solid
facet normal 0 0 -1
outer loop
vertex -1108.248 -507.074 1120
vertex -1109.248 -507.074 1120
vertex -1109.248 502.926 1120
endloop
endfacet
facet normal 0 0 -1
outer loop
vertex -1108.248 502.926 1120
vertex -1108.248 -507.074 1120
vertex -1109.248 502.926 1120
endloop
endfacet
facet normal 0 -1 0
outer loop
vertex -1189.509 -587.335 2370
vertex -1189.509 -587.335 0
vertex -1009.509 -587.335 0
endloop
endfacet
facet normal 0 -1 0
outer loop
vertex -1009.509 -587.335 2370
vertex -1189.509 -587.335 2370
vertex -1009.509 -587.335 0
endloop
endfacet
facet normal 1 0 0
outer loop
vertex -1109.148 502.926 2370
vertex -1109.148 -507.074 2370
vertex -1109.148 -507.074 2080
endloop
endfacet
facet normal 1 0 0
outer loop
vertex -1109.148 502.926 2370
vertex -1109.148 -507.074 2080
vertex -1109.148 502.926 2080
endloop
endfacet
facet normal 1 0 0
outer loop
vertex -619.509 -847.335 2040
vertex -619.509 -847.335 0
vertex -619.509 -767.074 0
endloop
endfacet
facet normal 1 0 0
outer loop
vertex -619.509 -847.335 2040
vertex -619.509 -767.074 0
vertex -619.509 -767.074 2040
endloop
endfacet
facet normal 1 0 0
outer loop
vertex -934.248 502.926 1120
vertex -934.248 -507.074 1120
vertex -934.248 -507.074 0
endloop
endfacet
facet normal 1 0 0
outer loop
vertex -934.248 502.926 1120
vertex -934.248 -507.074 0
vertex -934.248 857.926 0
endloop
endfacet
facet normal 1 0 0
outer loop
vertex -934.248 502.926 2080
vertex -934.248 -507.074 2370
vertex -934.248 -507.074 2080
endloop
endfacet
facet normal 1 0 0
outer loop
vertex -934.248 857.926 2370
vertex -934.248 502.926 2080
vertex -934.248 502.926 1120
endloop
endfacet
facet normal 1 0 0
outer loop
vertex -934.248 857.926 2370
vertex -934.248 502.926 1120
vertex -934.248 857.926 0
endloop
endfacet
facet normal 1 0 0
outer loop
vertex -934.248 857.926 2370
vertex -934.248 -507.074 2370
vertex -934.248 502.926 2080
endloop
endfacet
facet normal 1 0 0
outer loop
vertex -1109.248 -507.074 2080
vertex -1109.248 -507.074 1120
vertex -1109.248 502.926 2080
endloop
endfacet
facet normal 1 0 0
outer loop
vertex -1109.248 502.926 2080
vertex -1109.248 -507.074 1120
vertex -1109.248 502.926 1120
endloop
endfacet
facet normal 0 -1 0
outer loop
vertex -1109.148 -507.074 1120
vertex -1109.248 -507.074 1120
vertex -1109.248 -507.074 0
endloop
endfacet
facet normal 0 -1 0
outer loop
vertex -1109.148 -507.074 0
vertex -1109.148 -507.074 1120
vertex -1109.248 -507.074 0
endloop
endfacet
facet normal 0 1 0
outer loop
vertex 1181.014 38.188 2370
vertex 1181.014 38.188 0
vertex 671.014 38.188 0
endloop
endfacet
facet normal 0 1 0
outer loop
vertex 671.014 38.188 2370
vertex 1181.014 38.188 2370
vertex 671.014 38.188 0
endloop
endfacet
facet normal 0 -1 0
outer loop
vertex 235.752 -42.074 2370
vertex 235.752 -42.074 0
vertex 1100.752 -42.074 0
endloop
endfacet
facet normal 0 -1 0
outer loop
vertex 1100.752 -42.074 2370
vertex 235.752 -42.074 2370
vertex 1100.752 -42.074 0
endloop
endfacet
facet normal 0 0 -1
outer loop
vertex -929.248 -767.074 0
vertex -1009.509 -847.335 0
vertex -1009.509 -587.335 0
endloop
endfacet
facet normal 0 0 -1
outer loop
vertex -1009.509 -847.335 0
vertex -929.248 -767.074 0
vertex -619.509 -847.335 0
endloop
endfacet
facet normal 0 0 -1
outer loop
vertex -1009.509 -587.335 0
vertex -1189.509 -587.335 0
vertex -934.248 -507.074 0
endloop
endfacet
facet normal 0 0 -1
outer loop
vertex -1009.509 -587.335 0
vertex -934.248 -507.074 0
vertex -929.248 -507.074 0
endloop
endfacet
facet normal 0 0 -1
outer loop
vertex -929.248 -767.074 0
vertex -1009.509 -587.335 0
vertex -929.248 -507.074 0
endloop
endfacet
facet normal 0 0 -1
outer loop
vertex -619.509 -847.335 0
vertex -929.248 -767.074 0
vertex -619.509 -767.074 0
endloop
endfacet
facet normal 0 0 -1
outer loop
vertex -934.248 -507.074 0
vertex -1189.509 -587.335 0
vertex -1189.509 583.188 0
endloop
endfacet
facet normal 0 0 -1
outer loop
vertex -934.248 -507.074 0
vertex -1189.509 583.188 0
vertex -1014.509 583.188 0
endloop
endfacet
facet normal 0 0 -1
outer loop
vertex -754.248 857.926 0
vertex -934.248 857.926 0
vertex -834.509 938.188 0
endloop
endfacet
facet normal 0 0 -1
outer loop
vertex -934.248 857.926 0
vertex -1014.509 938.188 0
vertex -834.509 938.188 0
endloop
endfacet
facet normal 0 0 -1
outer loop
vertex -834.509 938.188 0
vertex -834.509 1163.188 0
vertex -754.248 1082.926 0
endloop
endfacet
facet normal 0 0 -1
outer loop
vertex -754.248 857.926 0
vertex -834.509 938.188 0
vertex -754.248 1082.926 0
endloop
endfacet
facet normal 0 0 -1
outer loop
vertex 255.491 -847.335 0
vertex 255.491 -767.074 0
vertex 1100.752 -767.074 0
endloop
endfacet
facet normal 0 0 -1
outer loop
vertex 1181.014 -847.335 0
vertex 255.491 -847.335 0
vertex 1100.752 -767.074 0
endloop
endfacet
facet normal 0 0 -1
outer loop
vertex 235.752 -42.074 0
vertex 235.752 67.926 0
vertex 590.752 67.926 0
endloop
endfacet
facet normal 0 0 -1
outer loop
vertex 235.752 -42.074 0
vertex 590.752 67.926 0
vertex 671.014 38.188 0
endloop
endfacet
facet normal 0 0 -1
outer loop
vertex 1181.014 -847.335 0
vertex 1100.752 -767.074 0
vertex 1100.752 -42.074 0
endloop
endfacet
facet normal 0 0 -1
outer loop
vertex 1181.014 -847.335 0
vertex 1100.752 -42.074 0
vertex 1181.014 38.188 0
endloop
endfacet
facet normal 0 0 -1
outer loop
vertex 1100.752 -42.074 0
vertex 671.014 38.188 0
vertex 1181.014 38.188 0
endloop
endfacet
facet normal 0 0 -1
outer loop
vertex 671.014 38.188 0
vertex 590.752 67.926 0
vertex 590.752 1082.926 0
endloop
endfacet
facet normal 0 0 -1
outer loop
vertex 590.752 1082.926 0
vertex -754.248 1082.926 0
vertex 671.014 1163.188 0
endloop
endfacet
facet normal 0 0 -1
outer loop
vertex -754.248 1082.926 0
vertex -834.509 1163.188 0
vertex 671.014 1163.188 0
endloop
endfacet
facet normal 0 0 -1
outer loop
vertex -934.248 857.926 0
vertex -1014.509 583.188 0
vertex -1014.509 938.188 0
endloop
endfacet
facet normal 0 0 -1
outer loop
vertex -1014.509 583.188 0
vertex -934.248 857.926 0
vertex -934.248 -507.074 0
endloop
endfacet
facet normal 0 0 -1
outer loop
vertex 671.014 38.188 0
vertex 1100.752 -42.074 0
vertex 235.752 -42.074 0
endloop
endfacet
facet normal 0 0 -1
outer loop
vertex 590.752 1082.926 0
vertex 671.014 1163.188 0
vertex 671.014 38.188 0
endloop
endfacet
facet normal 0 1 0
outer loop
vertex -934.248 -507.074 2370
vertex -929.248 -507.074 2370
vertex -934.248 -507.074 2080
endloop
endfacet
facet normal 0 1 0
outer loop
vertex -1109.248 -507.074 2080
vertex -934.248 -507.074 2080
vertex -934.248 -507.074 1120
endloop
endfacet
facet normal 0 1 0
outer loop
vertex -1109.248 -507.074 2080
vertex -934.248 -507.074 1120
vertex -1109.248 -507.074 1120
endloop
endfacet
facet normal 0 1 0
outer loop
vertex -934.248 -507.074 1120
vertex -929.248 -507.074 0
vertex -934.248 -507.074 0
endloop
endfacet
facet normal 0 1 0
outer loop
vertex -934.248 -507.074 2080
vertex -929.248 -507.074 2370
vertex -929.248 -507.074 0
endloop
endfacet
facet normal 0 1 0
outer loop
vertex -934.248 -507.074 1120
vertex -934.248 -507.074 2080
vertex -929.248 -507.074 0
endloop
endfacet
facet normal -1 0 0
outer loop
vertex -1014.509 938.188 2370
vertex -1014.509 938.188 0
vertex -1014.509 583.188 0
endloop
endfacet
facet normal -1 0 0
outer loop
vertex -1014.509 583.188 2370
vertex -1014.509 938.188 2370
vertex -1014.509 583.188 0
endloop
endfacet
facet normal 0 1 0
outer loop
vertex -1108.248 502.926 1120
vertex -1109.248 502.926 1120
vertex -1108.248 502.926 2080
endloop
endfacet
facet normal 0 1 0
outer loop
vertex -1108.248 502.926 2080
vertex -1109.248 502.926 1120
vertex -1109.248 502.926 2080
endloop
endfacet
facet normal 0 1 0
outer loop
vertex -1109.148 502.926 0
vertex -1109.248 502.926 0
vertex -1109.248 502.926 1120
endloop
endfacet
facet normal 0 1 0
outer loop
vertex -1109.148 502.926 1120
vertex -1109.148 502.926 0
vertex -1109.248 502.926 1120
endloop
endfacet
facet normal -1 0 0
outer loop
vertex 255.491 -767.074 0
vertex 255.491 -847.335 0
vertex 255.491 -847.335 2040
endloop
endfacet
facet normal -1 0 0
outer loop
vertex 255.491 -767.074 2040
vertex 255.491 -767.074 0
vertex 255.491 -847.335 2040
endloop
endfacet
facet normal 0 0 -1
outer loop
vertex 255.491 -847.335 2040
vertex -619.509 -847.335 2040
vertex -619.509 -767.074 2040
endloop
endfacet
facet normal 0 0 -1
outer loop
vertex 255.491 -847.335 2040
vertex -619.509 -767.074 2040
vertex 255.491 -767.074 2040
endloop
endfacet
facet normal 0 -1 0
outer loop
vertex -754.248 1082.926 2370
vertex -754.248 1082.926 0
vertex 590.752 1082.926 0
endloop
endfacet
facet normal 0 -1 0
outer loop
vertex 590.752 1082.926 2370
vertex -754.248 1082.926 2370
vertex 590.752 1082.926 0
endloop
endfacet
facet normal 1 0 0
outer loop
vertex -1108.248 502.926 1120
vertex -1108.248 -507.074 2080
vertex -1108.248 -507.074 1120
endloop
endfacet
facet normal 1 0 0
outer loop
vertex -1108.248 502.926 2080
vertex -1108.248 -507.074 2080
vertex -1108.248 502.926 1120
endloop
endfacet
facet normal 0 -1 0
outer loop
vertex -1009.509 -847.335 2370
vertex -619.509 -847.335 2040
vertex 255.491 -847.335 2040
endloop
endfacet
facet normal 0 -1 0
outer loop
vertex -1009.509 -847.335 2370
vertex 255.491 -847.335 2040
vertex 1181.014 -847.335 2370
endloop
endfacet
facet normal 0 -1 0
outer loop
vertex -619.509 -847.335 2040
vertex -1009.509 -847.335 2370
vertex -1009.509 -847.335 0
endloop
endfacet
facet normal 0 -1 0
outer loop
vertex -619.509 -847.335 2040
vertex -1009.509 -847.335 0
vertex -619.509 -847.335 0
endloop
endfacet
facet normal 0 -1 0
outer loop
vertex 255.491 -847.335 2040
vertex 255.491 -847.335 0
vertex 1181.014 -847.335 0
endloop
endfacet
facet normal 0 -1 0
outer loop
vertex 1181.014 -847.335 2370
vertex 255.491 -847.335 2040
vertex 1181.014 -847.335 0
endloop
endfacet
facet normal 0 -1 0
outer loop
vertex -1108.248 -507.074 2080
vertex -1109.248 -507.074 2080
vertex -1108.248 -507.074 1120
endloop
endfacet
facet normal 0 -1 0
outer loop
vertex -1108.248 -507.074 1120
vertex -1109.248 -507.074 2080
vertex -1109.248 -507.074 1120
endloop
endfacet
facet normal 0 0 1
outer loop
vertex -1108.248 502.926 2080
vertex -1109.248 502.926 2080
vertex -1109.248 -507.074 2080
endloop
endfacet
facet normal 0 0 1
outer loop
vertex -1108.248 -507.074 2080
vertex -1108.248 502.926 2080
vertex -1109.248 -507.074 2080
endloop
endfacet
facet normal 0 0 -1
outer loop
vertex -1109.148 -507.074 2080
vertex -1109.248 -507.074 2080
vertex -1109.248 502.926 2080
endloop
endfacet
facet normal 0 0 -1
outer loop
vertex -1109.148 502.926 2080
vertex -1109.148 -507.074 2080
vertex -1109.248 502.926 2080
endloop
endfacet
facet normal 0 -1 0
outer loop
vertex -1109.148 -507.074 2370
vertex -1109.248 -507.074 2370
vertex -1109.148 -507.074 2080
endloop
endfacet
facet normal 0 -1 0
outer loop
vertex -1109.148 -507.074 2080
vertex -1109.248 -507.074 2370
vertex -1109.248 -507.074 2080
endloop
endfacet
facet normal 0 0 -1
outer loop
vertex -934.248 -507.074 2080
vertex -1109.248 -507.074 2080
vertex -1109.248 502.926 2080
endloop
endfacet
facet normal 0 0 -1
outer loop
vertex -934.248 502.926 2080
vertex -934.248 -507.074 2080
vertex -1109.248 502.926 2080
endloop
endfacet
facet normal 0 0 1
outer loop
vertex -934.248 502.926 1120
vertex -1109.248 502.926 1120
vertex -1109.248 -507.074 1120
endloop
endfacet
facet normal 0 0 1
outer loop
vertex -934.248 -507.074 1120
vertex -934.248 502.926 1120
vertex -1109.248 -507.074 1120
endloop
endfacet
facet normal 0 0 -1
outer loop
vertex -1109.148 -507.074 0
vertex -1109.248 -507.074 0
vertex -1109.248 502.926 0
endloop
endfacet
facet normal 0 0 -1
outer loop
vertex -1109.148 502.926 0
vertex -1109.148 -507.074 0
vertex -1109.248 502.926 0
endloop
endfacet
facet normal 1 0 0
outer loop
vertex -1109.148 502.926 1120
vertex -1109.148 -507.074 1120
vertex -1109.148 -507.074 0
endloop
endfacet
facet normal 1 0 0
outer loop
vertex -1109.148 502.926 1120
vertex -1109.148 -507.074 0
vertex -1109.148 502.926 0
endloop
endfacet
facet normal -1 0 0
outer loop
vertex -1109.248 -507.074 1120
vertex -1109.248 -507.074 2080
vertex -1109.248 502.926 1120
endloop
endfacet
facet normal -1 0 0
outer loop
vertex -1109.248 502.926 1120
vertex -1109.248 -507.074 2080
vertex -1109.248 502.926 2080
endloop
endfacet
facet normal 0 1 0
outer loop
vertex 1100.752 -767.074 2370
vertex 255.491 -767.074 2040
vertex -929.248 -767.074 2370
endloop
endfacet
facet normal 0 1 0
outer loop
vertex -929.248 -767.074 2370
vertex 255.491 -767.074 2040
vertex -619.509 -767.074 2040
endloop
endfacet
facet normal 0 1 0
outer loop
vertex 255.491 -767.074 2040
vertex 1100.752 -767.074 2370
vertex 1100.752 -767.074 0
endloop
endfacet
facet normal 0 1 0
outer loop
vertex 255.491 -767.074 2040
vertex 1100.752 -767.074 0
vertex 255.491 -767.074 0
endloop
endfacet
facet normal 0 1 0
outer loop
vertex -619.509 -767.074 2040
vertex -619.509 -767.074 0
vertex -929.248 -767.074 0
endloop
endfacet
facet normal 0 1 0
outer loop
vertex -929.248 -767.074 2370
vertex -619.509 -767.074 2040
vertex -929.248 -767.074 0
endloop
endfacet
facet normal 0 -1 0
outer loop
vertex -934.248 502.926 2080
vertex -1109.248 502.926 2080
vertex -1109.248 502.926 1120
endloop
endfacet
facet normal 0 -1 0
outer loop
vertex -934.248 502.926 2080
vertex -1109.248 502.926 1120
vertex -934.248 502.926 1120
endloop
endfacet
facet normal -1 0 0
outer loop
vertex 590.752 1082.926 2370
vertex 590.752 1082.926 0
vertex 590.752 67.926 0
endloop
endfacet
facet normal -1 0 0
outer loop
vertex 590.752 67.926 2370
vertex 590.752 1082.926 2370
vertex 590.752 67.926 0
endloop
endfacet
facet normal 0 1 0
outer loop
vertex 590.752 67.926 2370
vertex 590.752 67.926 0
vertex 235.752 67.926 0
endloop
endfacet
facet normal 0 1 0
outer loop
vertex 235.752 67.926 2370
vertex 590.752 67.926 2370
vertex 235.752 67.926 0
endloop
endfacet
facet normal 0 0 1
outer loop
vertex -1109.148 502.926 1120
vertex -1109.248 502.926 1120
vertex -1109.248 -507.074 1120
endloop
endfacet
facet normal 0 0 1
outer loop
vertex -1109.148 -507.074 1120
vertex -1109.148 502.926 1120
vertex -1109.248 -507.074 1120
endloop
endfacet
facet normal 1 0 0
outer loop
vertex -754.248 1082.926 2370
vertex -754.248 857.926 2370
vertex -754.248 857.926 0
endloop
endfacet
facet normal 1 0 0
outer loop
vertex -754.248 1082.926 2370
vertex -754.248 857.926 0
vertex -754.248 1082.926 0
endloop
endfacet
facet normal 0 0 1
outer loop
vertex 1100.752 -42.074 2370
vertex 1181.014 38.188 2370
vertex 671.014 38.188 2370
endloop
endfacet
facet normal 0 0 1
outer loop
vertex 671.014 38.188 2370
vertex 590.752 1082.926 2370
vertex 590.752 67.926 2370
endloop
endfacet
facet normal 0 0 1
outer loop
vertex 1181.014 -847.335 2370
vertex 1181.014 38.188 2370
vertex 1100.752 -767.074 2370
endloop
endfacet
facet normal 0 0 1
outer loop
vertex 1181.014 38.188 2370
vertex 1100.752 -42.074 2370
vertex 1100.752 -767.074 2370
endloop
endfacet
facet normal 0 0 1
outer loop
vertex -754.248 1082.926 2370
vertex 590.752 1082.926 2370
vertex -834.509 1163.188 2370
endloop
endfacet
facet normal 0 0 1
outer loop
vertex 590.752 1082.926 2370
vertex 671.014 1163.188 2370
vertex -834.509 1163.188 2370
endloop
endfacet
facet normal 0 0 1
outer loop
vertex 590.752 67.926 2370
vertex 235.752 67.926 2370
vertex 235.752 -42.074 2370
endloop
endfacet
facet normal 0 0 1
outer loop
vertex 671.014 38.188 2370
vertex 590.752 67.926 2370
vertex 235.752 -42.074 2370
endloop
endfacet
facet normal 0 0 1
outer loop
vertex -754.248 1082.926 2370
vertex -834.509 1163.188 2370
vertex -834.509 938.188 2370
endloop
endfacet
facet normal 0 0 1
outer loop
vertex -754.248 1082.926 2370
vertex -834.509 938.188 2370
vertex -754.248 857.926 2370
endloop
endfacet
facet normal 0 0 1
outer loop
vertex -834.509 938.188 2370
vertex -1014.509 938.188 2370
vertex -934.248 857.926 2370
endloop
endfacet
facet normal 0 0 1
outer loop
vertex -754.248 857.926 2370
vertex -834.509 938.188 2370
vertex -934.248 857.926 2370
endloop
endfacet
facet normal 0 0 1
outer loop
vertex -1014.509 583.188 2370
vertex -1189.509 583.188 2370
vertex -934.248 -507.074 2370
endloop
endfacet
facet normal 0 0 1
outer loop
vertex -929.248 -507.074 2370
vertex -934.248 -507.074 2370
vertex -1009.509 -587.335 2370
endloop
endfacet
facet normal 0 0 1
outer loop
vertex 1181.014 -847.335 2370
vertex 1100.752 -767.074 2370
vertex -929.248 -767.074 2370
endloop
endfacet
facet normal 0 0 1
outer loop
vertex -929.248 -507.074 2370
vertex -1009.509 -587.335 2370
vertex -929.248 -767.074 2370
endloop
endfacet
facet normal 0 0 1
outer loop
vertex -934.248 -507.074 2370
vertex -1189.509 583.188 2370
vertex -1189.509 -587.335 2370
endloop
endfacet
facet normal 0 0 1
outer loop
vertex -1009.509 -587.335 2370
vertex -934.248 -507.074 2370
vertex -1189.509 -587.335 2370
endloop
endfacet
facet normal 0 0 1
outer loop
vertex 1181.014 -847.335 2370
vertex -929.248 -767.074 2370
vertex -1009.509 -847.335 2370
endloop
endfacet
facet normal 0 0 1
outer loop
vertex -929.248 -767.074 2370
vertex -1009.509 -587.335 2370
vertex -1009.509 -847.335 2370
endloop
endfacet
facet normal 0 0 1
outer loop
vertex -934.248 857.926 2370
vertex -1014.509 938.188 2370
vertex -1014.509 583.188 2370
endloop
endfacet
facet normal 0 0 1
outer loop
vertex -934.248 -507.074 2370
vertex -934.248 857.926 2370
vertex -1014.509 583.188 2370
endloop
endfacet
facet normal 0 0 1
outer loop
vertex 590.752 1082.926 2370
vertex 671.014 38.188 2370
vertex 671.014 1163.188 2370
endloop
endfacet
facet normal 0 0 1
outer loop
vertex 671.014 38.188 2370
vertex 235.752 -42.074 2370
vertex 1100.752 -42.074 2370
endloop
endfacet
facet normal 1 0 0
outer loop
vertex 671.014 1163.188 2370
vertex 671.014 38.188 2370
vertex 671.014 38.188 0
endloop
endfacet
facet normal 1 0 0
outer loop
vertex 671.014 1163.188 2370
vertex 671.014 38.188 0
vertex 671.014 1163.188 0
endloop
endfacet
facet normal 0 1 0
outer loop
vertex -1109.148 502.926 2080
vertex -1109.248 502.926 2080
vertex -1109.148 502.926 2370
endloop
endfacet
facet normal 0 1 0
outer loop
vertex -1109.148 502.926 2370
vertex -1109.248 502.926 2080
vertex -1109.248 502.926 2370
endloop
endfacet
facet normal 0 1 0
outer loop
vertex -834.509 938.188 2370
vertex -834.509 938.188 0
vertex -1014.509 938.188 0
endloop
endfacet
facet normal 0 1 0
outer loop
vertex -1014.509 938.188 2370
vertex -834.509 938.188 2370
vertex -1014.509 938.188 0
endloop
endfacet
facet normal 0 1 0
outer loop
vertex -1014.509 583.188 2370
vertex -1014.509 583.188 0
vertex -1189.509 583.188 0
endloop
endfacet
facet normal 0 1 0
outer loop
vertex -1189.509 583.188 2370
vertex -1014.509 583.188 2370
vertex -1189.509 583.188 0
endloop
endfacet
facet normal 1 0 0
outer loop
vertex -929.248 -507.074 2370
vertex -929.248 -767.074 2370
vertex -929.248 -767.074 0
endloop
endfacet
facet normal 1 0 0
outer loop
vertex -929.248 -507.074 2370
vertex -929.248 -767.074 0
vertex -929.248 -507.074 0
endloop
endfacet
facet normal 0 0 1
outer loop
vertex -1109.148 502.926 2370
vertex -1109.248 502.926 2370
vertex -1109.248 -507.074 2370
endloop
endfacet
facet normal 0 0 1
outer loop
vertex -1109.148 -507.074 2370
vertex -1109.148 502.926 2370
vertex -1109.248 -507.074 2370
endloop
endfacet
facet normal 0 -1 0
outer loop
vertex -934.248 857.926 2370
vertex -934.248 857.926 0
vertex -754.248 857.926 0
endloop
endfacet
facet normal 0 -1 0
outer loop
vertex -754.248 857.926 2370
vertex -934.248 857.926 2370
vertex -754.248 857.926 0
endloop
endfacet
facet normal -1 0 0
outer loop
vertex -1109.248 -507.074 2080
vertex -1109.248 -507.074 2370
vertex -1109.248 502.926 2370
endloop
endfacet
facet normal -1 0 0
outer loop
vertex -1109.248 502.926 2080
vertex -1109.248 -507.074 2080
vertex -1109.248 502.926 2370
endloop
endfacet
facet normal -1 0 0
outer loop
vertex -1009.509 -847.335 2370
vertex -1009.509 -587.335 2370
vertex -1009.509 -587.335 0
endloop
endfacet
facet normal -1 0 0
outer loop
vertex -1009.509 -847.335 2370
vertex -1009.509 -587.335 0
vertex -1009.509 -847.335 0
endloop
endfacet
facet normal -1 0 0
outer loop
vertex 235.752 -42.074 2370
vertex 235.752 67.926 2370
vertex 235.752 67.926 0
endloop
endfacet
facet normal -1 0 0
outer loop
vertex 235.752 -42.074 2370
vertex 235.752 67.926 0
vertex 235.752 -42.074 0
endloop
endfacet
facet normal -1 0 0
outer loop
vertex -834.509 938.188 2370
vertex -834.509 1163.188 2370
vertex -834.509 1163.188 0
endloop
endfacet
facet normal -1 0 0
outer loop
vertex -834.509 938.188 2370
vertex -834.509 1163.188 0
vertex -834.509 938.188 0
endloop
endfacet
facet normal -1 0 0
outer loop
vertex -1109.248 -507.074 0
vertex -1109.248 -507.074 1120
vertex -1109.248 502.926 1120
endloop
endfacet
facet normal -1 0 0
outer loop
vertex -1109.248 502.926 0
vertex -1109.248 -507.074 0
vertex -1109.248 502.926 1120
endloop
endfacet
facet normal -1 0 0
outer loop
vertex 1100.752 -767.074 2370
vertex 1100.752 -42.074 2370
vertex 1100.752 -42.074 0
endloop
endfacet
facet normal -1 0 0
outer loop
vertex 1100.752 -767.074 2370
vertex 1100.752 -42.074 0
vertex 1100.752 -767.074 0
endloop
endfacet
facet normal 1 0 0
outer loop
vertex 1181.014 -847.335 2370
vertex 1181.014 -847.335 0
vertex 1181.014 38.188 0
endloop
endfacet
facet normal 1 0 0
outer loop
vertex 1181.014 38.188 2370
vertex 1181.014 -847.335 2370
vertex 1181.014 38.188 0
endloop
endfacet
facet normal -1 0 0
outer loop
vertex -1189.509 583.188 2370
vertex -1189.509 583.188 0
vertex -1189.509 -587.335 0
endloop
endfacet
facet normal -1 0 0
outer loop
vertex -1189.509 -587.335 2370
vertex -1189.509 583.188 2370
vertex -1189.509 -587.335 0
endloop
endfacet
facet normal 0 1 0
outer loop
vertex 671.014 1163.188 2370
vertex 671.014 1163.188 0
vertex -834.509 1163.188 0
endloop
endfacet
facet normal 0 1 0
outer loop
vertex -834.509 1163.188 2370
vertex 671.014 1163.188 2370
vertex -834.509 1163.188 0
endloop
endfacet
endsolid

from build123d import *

# Parameters (mm, degrees)
F1_DEPTH = 2370
F2_W     = 875
F2_H     = 2040
F3_DEPTH = 80.2615196258
F5_DEPTH = 175
F6_DEPTH = 175
F7_DEPTH = 0.1
F8_DEPTH = 1


with BuildPart() as f1:
    # F0 (on Top) → F1 (new body)
    with BuildSketch(Plane.XY):
        Polygon((-1014.5091533661, 938.1877069533), (-1014.5091533661, 583.1877069533), (-1189.5091533661, 583.1877069533), (-1189.5091533661, -587.3353322983), (-1009.5091533661, -587.3353322983), (-1009.5091533661, -847.3353322983), (1181.0138858855, -847.3353322983), (1181.0138858855, 38.1877069533), (671.0138858855, 38.1877069533), (671.0138858855, 1163.1877069533), (-834.5091533661, 1163.1877069533), (-834.5091533661, 938.1877069533), align=None)
        Polygon((1100.7523662597, -42.0738126725), (1100.7523662597, -767.0738126725), (-929.2476337403, -767.0738126725), (-929.2476337403, -507.0738126725), (-1109.2476337403, -507.0738126725), (-1109.2476337403, 502.9261873275), (-934.2476337403, 502.9261873275), (-934.2476337403, 857.9261873275), (-754.2476337403, 857.9261873275), (-754.2476337403, 1082.9261873275), (590.7523662597, 1082.9261873275), (590.7523662597, 67.9261873275), (235.7523662597, 67.9261873275), (235.7523662597, -42.0738126725), align=None, mode=Mode.SUBTRACT)
    extrude(amount=F1_DEPTH)

    # F2 (on face) → F3 (cut, through all)
    with BuildSketch(Plane.XZ.offset(847.3353322983)):
        with Locations((-182.0091533661, 1020)):
            Rectangle(F2_W, F2_H)
    extrude(amount=-F3_DEPTH, mode=Mode.SUBTRACT)

    # F4 (on face) → F5 (join, through all)
    with BuildSketch(Plane.YZ.offset(-1109.2476337403)):
        Polygon((0, 2080), (502.9261873275, 2080), (502.9261873275, 2370), (-507.0738126725, 2370), (-507.0738126725, 2080), align=None)
    extrude(amount=F5_DEPTH)

    # F4 (on face) → F6 (join, through all)
    with BuildSketch(Plane.YZ.offset(-1109.2476337403)):
        Polygon((502.9261873275, 0), (502.9261873275, 1120), (-139.1143798828, 1120), (-507.0738126725, 1120), (-507.0738126725, 0), align=None)
    extrude(amount=F6_DEPTH)


with BuildPart() as f7:
    # F4 (on face) → F7 (new body)
    with BuildSketch(Plane.YZ.offset(-1109.2476337403)):
        Polygon((0, 2080), (502.9261873275, 2080), (502.9261873275, 2370), (-507.0738126725, 2370), (-507.0738126725, 2080), align=None)
    extrude(amount=F7_DEPTH)


with BuildPart() as f7b:
    # F4 (on face) → F7, piece 2 (new body)
    with BuildSketch(Plane.YZ.offset(-1109.2476337403)):
        Polygon((502.9261873275, 0), (502.9261873275, 1120), (-139.1143798828, 1120), (-507.0738126725, 1120), (-507.0738126725, 0), align=None)
    extrude(amount=F7_DEPTH)


with BuildPart() as f8:
    # F4 (on face) → F8 (new body)
    with BuildSketch(Plane.YZ.offset(-1109.2476337403)):
        Polygon((502.9261873275, 1120), (502.9261873275, 2080), (0, 2080), (-507.0738126725, 2080), (-507.0738126725, 1120), (-139.1143798828, 1120), align=None)
    extrude(amount=F8_DEPTH)


solid = Compound([f1.part, f7.part, f7b.part, f8.part])
